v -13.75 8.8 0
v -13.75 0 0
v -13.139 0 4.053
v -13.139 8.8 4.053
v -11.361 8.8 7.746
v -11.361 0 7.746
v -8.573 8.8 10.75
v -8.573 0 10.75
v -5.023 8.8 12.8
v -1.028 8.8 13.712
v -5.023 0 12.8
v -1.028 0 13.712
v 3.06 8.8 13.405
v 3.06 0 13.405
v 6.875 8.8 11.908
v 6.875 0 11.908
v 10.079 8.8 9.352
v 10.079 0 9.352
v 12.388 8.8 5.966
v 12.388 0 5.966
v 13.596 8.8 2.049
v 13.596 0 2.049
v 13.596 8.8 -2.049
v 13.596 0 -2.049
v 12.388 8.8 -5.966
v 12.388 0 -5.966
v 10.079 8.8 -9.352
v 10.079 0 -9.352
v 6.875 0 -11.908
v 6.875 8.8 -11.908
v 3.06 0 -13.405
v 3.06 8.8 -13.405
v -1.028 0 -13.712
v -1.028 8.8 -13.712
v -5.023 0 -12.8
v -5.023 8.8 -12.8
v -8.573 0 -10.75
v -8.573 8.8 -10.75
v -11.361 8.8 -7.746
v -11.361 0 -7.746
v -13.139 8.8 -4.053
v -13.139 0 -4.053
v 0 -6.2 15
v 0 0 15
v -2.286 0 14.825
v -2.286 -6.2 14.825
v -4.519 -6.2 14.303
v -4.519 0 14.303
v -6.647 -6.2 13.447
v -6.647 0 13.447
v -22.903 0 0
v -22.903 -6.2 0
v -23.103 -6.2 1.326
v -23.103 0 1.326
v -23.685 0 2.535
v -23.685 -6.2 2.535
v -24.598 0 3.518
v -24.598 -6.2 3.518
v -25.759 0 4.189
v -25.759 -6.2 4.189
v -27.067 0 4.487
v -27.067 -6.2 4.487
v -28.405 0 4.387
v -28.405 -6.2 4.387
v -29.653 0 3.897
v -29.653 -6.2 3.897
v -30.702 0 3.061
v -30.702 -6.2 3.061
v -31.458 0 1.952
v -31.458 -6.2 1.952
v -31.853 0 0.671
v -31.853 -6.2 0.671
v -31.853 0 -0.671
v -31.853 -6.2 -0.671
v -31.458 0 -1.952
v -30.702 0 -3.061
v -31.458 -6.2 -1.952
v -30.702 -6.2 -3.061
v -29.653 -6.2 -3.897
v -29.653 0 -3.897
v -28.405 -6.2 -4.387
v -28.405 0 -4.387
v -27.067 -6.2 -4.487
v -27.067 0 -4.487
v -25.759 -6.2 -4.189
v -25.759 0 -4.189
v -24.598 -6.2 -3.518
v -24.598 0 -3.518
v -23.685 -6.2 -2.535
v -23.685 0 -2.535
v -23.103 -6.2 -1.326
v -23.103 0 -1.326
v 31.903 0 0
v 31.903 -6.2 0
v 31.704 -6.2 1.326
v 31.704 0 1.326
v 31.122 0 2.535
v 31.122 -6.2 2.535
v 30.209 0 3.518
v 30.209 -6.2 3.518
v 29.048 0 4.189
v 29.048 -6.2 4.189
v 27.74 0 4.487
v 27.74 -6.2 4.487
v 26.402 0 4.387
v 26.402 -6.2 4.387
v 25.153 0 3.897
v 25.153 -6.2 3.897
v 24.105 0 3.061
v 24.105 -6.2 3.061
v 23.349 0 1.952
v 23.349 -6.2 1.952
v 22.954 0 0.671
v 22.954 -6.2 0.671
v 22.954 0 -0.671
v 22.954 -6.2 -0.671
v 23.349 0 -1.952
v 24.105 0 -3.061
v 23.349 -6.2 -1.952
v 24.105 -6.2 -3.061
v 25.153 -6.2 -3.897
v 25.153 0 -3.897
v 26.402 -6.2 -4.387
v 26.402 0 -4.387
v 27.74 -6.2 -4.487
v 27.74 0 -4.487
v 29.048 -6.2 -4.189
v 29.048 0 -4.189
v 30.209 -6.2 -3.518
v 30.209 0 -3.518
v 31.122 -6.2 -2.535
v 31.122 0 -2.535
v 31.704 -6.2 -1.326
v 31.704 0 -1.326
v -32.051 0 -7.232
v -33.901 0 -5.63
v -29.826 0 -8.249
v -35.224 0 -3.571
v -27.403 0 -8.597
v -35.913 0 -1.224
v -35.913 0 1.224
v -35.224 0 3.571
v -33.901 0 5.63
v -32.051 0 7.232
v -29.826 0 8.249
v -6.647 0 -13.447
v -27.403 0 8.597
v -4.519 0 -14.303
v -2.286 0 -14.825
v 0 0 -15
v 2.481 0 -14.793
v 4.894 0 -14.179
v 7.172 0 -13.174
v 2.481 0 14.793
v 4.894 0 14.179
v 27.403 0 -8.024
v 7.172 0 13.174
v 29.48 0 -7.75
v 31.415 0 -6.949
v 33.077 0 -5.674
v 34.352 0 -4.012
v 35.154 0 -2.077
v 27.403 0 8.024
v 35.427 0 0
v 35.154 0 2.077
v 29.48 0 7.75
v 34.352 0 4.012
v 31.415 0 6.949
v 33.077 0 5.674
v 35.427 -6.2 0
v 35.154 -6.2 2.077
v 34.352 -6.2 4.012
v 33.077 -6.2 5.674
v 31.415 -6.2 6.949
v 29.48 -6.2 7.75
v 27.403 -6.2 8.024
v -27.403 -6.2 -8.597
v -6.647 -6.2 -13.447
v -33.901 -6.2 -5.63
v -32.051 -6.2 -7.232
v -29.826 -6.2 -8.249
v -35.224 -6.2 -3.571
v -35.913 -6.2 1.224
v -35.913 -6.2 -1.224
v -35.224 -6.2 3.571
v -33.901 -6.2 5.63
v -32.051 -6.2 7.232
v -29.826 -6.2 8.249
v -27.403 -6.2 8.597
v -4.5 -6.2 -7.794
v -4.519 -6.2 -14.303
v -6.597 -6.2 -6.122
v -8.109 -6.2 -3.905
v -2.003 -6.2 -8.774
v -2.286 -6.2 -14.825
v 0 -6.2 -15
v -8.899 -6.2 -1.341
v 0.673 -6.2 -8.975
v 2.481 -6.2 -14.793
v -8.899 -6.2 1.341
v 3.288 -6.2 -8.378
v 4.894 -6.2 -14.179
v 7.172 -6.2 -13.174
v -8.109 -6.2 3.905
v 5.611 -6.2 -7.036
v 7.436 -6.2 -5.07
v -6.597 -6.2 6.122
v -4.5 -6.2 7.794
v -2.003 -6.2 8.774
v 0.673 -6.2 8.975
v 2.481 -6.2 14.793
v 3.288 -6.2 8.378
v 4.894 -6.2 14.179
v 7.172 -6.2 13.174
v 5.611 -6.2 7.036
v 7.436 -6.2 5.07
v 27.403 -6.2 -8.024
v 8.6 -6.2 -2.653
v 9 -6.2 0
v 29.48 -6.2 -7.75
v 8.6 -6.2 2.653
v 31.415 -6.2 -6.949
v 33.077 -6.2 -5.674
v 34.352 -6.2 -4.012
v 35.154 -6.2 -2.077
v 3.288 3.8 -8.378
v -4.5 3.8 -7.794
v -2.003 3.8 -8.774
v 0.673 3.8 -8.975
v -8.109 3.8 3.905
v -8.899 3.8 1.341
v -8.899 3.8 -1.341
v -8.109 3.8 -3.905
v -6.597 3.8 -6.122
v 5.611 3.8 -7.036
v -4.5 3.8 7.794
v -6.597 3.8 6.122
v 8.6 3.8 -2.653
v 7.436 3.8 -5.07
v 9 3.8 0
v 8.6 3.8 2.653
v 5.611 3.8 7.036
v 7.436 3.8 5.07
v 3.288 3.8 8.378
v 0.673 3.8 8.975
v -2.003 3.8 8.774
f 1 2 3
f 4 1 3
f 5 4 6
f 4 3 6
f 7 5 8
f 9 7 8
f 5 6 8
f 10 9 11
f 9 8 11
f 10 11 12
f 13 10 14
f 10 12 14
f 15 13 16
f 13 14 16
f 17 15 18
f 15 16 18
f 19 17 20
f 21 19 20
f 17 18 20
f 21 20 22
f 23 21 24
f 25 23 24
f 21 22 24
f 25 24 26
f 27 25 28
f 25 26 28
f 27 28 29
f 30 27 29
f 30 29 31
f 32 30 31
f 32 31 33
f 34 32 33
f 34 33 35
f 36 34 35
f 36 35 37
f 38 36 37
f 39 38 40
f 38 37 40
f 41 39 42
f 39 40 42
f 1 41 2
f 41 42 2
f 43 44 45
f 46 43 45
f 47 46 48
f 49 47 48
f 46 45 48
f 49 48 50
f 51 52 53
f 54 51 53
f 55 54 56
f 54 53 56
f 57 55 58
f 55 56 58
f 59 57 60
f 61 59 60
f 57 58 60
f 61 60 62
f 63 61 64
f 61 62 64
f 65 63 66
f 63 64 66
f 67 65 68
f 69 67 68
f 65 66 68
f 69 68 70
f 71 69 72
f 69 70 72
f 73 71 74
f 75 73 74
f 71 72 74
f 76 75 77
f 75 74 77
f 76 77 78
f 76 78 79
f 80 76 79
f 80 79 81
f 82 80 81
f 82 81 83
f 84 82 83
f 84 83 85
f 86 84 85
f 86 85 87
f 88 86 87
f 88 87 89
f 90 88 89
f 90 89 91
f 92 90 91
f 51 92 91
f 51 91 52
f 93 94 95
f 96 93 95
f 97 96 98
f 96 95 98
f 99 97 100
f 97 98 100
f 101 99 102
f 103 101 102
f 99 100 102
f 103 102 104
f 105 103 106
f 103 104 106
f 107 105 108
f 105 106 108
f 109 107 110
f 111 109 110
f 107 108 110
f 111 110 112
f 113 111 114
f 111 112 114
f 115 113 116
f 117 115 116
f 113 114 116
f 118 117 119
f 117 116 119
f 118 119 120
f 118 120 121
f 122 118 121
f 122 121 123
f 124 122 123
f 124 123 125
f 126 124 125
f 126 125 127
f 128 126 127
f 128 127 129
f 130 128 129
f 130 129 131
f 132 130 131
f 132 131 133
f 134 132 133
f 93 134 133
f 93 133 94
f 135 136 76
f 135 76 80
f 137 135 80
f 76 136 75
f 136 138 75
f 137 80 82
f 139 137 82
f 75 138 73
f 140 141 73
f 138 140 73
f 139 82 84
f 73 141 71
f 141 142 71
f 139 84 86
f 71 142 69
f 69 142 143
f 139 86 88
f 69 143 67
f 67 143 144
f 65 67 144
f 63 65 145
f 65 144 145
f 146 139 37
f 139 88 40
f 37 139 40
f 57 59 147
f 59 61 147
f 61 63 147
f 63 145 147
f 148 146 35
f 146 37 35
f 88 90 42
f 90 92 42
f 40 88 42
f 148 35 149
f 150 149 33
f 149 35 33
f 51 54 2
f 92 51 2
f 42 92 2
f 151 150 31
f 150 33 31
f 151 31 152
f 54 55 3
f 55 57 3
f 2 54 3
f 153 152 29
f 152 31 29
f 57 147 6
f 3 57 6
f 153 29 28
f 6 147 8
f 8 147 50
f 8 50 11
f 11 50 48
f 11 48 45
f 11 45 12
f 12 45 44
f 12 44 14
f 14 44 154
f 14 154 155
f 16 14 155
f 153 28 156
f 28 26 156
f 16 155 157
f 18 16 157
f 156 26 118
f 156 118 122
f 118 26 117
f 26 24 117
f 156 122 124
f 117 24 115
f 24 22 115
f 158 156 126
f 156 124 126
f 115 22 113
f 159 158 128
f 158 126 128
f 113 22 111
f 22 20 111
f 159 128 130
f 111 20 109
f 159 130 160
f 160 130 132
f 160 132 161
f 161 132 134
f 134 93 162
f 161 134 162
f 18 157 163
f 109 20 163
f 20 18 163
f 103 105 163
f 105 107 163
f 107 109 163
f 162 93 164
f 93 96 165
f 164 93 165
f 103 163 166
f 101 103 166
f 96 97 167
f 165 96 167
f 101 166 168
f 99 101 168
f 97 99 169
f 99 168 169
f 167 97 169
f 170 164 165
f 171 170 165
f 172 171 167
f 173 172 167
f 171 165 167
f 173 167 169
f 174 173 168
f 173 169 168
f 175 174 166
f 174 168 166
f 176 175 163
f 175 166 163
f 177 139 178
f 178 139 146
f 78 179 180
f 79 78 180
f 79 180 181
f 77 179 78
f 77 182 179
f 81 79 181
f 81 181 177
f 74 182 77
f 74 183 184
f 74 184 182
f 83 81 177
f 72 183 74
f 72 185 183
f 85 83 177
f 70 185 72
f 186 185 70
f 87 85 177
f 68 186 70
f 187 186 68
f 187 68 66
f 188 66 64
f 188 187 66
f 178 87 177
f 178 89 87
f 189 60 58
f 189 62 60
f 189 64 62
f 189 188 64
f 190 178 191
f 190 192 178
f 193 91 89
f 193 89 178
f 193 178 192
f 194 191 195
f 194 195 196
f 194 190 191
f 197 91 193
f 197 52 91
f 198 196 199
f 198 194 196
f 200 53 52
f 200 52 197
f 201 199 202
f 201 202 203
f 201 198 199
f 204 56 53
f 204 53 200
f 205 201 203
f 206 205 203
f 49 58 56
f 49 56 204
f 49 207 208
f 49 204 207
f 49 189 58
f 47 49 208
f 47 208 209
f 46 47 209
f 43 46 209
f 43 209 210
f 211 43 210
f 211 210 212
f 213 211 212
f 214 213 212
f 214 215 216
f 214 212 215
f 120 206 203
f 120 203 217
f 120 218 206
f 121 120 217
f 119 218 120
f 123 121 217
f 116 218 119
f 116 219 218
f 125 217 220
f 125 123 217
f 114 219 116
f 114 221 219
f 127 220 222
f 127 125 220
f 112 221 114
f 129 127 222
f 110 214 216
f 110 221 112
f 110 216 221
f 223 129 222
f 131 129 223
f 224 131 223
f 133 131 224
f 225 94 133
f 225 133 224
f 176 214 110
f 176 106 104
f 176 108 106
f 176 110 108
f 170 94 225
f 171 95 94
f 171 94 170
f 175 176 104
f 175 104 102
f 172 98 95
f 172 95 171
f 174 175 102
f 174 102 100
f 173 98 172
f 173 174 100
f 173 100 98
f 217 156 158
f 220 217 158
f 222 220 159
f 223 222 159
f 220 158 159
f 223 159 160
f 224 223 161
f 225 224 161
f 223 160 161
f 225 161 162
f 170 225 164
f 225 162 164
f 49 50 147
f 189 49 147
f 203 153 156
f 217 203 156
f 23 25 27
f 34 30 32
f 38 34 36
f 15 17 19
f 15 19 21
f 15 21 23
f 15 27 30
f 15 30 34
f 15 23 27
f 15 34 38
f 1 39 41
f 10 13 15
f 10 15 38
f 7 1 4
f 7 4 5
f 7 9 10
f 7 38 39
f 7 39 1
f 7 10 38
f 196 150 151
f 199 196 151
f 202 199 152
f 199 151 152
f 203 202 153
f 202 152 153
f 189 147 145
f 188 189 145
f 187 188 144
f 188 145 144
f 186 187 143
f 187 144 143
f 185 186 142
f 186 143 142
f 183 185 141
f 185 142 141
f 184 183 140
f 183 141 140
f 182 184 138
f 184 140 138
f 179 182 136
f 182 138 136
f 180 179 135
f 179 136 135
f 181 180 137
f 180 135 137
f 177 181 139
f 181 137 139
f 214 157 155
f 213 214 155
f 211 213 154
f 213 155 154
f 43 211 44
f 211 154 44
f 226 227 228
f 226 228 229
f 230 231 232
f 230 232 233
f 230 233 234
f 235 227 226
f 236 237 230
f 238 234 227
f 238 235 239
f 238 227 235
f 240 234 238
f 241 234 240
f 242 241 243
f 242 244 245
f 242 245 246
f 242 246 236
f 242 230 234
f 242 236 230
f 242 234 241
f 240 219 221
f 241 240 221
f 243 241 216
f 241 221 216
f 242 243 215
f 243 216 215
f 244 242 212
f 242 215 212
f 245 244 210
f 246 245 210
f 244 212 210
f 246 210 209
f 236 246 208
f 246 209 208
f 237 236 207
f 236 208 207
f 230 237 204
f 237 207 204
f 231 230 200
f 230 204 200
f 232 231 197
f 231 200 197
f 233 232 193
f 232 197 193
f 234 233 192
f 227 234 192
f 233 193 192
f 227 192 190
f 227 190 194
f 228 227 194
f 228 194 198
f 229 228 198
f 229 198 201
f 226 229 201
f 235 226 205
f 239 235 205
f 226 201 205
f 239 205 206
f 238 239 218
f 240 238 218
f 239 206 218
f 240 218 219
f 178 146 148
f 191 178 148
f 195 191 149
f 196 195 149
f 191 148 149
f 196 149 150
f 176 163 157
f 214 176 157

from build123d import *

# Parameters (mm, degrees)
F1_DEPTH = 6.2
F2_R     = 13.75
F3_DEPTH = 8.8
F4_R     = 4.5
F4_R_2   = 9
F5_R     = 4.5
F6_DEPTH = 10


with BuildPart() as f1:
    # F0 (on Front) → F1 (new body)
    with BuildSketch(Plane.XZ):
        with BuildLine():
            Line((0, 0), (15, 0))
            ThreePointArc((15, 0), (12.8954858771, 7.662013051), (7.1724741341, 13.1740508119))
            Line((7.1724741341, 13.1740508119), (0, 15))
            Line((0, 15), (-6.6466510201, 13.4470082255))
            ThreePointArc((-6.6466510201, 13.4470082255), (-12.7416593366, 7.9151827111), (-15, 0))
            Line((-15, 0), (0, 0))
        make_face()
        with BuildLine():
            Line((19.3797829829, 0), (15, 0))
            ThreePointArc((15, 0), (12.8954858771, -7.662013051), (7.1724741341, -13.1740508119))
            Line((7.1724741341, -13.1740508119), (27.4034789598, -8.023695977))
            ThreePointArc((27.4034789598, -8.023695977), (21.7298691243, -5.6736098355), (19.3797829829, 0))
        make_face()
        with BuildLine():
            ThreePointArc((7.1724741341, -13.1740508119), (12.8954858771, -7.662013051), (15, 0))
            Line((15, 0), (0, 0))
            Line((0, 0), (-15, 0))
            ThreePointArc((-15, 0), (-12.7416593366, -7.9151827111), (-6.6466510201, -13.4470082255))
            Line((-6.6466510201, -13.4470082255), (0, -15))
            Line((0, -15), (7.1724741341, -13.1740508119))
        make_face()
        with BuildLine():
            ThreePointArc((7.1724741341, 13.1740508119), (12.8954858771, 7.662013051), (15, 0))
            Line((15, 0), (19.3797829829, 0))
            ThreePointArc((19.3797829829, 0), (21.7298691243, 5.6736098355), (27.4034789598, 8.023695977))
            Line((27.4034789598, 8.023695977), (7.1724741341, 13.1740508119))
        make_face()
        with BuildLine():
            Line((0, 15), (7.1724741341, 13.1740508119))
            ThreePointArc((7.1724741341, 13.1740508119), (3.7006241245, 14.5363468963), (0, 15))
        make_face()
        with BuildLine():
            ThreePointArc((0, -15), (3.7006241245, -14.5363468963), (7.1724741341, -13.1740508119))
            Line((7.1724741341, -13.1740508119), (0, -15))
        make_face()
        with BuildLine():
            ThreePointArc((27.4034789598, 8.023695977), (21.7298691243, 5.6736098355), (19.3797829829, 0))
            ThreePointArc((19.3797829829, 0), (21.7298691243, -5.6736098355), (27.4034789598, -8.023695977))
            ThreePointArc((27.4034789598, -8.023695977), (33.0770887953, -5.6736098355), (35.4271749368, 0))
            ThreePointArc((35.4271749368, 0), (33.0770887953, 5.6736098355), (27.4034789598, 8.023695977))
        make_face()
        with BuildLine():
            Line((-6.6466510201, 13.4470082255), (0, 15))
            ThreePointArc((0, 15), (-3.4128343512, 14.6065930898), (-6.6466510201, 13.4470082255))
        make_face()
        with BuildLine():
            ThreePointArc((-6.6466510201, -13.4470082255), (-3.4128343512, -14.6065930898), (0, -15))
            Line((0, -15), (-6.6466510201, -13.4470082255))
        make_face()
        with BuildLine():
            Line((-18.8063090901, 0), (-15, 0))
            ThreePointArc((-15, 0), (-12.7416593366, 7.9151827111), (-6.6466510201, 13.4470082255))
            Line((-6.6466510201, 13.4470082255), (-27.4034789598, 8.5971698697))
            ThreePointArc((-27.4034789598, 8.5971698697), (-21.3243618459, 6.0791171139), (-18.8063090901, 0))
        make_face()
        with BuildLine():
            ThreePointArc((-6.6466510201, -13.4470082255), (-12.7416593366, -7.9151827111), (-15, 0))
            Line((-15, 0), (-18.8063090901, 0))
            ThreePointArc((-18.8063090901, 0), (-21.3243618459, -6.0791171139), (-27.4034789598, -8.5971698697))
            Line((-27.4034789598, -8.5971698697), (-6.6466510201, -13.4470082255))
        make_face()
        with BuildLine():
            ThreePointArc((-27.4034789598, -8.5971698697), (-21.3243618459, -6.0791171139), (-18.8063090901, 0))
            ThreePointArc((-18.8063090901, 0), (-21.3243618459, 6.0791171139), (-27.4034789598, 8.5971698697))
            ThreePointArc((-27.4034789598, 8.5971698697), (-36.0006488296, 0), (-27.4034789598, -8.5971698697))
        make_face()
    extrude(amount=F1_DEPTH)

    # F2 (on face) → F3 (join)
    with BuildSketch(Plane(origin=(0, 0, 0), x_dir=(-1, 0, 0), z_dir=(0, 1, 0))):
        Circle(F2_R)
    extrude(amount=F3_DEPTH)

    # F4 (on face) + F5 (on face) → F6 (cut)
    with BuildSketch(Plane.XZ.offset(6.2)):
        with Locations((27.4034789598, 0)):
            Circle(F4_R)
        Circle(F4_R_2)
    with BuildSketch(Plane.XZ.offset(6.2)):
        with Locations((-27.4034789598, 0)):
            Circle(F5_R)
    extrude(amount=-F6_DEPTH, mode=Mode.SUBTRACT)


solid = f1.part
